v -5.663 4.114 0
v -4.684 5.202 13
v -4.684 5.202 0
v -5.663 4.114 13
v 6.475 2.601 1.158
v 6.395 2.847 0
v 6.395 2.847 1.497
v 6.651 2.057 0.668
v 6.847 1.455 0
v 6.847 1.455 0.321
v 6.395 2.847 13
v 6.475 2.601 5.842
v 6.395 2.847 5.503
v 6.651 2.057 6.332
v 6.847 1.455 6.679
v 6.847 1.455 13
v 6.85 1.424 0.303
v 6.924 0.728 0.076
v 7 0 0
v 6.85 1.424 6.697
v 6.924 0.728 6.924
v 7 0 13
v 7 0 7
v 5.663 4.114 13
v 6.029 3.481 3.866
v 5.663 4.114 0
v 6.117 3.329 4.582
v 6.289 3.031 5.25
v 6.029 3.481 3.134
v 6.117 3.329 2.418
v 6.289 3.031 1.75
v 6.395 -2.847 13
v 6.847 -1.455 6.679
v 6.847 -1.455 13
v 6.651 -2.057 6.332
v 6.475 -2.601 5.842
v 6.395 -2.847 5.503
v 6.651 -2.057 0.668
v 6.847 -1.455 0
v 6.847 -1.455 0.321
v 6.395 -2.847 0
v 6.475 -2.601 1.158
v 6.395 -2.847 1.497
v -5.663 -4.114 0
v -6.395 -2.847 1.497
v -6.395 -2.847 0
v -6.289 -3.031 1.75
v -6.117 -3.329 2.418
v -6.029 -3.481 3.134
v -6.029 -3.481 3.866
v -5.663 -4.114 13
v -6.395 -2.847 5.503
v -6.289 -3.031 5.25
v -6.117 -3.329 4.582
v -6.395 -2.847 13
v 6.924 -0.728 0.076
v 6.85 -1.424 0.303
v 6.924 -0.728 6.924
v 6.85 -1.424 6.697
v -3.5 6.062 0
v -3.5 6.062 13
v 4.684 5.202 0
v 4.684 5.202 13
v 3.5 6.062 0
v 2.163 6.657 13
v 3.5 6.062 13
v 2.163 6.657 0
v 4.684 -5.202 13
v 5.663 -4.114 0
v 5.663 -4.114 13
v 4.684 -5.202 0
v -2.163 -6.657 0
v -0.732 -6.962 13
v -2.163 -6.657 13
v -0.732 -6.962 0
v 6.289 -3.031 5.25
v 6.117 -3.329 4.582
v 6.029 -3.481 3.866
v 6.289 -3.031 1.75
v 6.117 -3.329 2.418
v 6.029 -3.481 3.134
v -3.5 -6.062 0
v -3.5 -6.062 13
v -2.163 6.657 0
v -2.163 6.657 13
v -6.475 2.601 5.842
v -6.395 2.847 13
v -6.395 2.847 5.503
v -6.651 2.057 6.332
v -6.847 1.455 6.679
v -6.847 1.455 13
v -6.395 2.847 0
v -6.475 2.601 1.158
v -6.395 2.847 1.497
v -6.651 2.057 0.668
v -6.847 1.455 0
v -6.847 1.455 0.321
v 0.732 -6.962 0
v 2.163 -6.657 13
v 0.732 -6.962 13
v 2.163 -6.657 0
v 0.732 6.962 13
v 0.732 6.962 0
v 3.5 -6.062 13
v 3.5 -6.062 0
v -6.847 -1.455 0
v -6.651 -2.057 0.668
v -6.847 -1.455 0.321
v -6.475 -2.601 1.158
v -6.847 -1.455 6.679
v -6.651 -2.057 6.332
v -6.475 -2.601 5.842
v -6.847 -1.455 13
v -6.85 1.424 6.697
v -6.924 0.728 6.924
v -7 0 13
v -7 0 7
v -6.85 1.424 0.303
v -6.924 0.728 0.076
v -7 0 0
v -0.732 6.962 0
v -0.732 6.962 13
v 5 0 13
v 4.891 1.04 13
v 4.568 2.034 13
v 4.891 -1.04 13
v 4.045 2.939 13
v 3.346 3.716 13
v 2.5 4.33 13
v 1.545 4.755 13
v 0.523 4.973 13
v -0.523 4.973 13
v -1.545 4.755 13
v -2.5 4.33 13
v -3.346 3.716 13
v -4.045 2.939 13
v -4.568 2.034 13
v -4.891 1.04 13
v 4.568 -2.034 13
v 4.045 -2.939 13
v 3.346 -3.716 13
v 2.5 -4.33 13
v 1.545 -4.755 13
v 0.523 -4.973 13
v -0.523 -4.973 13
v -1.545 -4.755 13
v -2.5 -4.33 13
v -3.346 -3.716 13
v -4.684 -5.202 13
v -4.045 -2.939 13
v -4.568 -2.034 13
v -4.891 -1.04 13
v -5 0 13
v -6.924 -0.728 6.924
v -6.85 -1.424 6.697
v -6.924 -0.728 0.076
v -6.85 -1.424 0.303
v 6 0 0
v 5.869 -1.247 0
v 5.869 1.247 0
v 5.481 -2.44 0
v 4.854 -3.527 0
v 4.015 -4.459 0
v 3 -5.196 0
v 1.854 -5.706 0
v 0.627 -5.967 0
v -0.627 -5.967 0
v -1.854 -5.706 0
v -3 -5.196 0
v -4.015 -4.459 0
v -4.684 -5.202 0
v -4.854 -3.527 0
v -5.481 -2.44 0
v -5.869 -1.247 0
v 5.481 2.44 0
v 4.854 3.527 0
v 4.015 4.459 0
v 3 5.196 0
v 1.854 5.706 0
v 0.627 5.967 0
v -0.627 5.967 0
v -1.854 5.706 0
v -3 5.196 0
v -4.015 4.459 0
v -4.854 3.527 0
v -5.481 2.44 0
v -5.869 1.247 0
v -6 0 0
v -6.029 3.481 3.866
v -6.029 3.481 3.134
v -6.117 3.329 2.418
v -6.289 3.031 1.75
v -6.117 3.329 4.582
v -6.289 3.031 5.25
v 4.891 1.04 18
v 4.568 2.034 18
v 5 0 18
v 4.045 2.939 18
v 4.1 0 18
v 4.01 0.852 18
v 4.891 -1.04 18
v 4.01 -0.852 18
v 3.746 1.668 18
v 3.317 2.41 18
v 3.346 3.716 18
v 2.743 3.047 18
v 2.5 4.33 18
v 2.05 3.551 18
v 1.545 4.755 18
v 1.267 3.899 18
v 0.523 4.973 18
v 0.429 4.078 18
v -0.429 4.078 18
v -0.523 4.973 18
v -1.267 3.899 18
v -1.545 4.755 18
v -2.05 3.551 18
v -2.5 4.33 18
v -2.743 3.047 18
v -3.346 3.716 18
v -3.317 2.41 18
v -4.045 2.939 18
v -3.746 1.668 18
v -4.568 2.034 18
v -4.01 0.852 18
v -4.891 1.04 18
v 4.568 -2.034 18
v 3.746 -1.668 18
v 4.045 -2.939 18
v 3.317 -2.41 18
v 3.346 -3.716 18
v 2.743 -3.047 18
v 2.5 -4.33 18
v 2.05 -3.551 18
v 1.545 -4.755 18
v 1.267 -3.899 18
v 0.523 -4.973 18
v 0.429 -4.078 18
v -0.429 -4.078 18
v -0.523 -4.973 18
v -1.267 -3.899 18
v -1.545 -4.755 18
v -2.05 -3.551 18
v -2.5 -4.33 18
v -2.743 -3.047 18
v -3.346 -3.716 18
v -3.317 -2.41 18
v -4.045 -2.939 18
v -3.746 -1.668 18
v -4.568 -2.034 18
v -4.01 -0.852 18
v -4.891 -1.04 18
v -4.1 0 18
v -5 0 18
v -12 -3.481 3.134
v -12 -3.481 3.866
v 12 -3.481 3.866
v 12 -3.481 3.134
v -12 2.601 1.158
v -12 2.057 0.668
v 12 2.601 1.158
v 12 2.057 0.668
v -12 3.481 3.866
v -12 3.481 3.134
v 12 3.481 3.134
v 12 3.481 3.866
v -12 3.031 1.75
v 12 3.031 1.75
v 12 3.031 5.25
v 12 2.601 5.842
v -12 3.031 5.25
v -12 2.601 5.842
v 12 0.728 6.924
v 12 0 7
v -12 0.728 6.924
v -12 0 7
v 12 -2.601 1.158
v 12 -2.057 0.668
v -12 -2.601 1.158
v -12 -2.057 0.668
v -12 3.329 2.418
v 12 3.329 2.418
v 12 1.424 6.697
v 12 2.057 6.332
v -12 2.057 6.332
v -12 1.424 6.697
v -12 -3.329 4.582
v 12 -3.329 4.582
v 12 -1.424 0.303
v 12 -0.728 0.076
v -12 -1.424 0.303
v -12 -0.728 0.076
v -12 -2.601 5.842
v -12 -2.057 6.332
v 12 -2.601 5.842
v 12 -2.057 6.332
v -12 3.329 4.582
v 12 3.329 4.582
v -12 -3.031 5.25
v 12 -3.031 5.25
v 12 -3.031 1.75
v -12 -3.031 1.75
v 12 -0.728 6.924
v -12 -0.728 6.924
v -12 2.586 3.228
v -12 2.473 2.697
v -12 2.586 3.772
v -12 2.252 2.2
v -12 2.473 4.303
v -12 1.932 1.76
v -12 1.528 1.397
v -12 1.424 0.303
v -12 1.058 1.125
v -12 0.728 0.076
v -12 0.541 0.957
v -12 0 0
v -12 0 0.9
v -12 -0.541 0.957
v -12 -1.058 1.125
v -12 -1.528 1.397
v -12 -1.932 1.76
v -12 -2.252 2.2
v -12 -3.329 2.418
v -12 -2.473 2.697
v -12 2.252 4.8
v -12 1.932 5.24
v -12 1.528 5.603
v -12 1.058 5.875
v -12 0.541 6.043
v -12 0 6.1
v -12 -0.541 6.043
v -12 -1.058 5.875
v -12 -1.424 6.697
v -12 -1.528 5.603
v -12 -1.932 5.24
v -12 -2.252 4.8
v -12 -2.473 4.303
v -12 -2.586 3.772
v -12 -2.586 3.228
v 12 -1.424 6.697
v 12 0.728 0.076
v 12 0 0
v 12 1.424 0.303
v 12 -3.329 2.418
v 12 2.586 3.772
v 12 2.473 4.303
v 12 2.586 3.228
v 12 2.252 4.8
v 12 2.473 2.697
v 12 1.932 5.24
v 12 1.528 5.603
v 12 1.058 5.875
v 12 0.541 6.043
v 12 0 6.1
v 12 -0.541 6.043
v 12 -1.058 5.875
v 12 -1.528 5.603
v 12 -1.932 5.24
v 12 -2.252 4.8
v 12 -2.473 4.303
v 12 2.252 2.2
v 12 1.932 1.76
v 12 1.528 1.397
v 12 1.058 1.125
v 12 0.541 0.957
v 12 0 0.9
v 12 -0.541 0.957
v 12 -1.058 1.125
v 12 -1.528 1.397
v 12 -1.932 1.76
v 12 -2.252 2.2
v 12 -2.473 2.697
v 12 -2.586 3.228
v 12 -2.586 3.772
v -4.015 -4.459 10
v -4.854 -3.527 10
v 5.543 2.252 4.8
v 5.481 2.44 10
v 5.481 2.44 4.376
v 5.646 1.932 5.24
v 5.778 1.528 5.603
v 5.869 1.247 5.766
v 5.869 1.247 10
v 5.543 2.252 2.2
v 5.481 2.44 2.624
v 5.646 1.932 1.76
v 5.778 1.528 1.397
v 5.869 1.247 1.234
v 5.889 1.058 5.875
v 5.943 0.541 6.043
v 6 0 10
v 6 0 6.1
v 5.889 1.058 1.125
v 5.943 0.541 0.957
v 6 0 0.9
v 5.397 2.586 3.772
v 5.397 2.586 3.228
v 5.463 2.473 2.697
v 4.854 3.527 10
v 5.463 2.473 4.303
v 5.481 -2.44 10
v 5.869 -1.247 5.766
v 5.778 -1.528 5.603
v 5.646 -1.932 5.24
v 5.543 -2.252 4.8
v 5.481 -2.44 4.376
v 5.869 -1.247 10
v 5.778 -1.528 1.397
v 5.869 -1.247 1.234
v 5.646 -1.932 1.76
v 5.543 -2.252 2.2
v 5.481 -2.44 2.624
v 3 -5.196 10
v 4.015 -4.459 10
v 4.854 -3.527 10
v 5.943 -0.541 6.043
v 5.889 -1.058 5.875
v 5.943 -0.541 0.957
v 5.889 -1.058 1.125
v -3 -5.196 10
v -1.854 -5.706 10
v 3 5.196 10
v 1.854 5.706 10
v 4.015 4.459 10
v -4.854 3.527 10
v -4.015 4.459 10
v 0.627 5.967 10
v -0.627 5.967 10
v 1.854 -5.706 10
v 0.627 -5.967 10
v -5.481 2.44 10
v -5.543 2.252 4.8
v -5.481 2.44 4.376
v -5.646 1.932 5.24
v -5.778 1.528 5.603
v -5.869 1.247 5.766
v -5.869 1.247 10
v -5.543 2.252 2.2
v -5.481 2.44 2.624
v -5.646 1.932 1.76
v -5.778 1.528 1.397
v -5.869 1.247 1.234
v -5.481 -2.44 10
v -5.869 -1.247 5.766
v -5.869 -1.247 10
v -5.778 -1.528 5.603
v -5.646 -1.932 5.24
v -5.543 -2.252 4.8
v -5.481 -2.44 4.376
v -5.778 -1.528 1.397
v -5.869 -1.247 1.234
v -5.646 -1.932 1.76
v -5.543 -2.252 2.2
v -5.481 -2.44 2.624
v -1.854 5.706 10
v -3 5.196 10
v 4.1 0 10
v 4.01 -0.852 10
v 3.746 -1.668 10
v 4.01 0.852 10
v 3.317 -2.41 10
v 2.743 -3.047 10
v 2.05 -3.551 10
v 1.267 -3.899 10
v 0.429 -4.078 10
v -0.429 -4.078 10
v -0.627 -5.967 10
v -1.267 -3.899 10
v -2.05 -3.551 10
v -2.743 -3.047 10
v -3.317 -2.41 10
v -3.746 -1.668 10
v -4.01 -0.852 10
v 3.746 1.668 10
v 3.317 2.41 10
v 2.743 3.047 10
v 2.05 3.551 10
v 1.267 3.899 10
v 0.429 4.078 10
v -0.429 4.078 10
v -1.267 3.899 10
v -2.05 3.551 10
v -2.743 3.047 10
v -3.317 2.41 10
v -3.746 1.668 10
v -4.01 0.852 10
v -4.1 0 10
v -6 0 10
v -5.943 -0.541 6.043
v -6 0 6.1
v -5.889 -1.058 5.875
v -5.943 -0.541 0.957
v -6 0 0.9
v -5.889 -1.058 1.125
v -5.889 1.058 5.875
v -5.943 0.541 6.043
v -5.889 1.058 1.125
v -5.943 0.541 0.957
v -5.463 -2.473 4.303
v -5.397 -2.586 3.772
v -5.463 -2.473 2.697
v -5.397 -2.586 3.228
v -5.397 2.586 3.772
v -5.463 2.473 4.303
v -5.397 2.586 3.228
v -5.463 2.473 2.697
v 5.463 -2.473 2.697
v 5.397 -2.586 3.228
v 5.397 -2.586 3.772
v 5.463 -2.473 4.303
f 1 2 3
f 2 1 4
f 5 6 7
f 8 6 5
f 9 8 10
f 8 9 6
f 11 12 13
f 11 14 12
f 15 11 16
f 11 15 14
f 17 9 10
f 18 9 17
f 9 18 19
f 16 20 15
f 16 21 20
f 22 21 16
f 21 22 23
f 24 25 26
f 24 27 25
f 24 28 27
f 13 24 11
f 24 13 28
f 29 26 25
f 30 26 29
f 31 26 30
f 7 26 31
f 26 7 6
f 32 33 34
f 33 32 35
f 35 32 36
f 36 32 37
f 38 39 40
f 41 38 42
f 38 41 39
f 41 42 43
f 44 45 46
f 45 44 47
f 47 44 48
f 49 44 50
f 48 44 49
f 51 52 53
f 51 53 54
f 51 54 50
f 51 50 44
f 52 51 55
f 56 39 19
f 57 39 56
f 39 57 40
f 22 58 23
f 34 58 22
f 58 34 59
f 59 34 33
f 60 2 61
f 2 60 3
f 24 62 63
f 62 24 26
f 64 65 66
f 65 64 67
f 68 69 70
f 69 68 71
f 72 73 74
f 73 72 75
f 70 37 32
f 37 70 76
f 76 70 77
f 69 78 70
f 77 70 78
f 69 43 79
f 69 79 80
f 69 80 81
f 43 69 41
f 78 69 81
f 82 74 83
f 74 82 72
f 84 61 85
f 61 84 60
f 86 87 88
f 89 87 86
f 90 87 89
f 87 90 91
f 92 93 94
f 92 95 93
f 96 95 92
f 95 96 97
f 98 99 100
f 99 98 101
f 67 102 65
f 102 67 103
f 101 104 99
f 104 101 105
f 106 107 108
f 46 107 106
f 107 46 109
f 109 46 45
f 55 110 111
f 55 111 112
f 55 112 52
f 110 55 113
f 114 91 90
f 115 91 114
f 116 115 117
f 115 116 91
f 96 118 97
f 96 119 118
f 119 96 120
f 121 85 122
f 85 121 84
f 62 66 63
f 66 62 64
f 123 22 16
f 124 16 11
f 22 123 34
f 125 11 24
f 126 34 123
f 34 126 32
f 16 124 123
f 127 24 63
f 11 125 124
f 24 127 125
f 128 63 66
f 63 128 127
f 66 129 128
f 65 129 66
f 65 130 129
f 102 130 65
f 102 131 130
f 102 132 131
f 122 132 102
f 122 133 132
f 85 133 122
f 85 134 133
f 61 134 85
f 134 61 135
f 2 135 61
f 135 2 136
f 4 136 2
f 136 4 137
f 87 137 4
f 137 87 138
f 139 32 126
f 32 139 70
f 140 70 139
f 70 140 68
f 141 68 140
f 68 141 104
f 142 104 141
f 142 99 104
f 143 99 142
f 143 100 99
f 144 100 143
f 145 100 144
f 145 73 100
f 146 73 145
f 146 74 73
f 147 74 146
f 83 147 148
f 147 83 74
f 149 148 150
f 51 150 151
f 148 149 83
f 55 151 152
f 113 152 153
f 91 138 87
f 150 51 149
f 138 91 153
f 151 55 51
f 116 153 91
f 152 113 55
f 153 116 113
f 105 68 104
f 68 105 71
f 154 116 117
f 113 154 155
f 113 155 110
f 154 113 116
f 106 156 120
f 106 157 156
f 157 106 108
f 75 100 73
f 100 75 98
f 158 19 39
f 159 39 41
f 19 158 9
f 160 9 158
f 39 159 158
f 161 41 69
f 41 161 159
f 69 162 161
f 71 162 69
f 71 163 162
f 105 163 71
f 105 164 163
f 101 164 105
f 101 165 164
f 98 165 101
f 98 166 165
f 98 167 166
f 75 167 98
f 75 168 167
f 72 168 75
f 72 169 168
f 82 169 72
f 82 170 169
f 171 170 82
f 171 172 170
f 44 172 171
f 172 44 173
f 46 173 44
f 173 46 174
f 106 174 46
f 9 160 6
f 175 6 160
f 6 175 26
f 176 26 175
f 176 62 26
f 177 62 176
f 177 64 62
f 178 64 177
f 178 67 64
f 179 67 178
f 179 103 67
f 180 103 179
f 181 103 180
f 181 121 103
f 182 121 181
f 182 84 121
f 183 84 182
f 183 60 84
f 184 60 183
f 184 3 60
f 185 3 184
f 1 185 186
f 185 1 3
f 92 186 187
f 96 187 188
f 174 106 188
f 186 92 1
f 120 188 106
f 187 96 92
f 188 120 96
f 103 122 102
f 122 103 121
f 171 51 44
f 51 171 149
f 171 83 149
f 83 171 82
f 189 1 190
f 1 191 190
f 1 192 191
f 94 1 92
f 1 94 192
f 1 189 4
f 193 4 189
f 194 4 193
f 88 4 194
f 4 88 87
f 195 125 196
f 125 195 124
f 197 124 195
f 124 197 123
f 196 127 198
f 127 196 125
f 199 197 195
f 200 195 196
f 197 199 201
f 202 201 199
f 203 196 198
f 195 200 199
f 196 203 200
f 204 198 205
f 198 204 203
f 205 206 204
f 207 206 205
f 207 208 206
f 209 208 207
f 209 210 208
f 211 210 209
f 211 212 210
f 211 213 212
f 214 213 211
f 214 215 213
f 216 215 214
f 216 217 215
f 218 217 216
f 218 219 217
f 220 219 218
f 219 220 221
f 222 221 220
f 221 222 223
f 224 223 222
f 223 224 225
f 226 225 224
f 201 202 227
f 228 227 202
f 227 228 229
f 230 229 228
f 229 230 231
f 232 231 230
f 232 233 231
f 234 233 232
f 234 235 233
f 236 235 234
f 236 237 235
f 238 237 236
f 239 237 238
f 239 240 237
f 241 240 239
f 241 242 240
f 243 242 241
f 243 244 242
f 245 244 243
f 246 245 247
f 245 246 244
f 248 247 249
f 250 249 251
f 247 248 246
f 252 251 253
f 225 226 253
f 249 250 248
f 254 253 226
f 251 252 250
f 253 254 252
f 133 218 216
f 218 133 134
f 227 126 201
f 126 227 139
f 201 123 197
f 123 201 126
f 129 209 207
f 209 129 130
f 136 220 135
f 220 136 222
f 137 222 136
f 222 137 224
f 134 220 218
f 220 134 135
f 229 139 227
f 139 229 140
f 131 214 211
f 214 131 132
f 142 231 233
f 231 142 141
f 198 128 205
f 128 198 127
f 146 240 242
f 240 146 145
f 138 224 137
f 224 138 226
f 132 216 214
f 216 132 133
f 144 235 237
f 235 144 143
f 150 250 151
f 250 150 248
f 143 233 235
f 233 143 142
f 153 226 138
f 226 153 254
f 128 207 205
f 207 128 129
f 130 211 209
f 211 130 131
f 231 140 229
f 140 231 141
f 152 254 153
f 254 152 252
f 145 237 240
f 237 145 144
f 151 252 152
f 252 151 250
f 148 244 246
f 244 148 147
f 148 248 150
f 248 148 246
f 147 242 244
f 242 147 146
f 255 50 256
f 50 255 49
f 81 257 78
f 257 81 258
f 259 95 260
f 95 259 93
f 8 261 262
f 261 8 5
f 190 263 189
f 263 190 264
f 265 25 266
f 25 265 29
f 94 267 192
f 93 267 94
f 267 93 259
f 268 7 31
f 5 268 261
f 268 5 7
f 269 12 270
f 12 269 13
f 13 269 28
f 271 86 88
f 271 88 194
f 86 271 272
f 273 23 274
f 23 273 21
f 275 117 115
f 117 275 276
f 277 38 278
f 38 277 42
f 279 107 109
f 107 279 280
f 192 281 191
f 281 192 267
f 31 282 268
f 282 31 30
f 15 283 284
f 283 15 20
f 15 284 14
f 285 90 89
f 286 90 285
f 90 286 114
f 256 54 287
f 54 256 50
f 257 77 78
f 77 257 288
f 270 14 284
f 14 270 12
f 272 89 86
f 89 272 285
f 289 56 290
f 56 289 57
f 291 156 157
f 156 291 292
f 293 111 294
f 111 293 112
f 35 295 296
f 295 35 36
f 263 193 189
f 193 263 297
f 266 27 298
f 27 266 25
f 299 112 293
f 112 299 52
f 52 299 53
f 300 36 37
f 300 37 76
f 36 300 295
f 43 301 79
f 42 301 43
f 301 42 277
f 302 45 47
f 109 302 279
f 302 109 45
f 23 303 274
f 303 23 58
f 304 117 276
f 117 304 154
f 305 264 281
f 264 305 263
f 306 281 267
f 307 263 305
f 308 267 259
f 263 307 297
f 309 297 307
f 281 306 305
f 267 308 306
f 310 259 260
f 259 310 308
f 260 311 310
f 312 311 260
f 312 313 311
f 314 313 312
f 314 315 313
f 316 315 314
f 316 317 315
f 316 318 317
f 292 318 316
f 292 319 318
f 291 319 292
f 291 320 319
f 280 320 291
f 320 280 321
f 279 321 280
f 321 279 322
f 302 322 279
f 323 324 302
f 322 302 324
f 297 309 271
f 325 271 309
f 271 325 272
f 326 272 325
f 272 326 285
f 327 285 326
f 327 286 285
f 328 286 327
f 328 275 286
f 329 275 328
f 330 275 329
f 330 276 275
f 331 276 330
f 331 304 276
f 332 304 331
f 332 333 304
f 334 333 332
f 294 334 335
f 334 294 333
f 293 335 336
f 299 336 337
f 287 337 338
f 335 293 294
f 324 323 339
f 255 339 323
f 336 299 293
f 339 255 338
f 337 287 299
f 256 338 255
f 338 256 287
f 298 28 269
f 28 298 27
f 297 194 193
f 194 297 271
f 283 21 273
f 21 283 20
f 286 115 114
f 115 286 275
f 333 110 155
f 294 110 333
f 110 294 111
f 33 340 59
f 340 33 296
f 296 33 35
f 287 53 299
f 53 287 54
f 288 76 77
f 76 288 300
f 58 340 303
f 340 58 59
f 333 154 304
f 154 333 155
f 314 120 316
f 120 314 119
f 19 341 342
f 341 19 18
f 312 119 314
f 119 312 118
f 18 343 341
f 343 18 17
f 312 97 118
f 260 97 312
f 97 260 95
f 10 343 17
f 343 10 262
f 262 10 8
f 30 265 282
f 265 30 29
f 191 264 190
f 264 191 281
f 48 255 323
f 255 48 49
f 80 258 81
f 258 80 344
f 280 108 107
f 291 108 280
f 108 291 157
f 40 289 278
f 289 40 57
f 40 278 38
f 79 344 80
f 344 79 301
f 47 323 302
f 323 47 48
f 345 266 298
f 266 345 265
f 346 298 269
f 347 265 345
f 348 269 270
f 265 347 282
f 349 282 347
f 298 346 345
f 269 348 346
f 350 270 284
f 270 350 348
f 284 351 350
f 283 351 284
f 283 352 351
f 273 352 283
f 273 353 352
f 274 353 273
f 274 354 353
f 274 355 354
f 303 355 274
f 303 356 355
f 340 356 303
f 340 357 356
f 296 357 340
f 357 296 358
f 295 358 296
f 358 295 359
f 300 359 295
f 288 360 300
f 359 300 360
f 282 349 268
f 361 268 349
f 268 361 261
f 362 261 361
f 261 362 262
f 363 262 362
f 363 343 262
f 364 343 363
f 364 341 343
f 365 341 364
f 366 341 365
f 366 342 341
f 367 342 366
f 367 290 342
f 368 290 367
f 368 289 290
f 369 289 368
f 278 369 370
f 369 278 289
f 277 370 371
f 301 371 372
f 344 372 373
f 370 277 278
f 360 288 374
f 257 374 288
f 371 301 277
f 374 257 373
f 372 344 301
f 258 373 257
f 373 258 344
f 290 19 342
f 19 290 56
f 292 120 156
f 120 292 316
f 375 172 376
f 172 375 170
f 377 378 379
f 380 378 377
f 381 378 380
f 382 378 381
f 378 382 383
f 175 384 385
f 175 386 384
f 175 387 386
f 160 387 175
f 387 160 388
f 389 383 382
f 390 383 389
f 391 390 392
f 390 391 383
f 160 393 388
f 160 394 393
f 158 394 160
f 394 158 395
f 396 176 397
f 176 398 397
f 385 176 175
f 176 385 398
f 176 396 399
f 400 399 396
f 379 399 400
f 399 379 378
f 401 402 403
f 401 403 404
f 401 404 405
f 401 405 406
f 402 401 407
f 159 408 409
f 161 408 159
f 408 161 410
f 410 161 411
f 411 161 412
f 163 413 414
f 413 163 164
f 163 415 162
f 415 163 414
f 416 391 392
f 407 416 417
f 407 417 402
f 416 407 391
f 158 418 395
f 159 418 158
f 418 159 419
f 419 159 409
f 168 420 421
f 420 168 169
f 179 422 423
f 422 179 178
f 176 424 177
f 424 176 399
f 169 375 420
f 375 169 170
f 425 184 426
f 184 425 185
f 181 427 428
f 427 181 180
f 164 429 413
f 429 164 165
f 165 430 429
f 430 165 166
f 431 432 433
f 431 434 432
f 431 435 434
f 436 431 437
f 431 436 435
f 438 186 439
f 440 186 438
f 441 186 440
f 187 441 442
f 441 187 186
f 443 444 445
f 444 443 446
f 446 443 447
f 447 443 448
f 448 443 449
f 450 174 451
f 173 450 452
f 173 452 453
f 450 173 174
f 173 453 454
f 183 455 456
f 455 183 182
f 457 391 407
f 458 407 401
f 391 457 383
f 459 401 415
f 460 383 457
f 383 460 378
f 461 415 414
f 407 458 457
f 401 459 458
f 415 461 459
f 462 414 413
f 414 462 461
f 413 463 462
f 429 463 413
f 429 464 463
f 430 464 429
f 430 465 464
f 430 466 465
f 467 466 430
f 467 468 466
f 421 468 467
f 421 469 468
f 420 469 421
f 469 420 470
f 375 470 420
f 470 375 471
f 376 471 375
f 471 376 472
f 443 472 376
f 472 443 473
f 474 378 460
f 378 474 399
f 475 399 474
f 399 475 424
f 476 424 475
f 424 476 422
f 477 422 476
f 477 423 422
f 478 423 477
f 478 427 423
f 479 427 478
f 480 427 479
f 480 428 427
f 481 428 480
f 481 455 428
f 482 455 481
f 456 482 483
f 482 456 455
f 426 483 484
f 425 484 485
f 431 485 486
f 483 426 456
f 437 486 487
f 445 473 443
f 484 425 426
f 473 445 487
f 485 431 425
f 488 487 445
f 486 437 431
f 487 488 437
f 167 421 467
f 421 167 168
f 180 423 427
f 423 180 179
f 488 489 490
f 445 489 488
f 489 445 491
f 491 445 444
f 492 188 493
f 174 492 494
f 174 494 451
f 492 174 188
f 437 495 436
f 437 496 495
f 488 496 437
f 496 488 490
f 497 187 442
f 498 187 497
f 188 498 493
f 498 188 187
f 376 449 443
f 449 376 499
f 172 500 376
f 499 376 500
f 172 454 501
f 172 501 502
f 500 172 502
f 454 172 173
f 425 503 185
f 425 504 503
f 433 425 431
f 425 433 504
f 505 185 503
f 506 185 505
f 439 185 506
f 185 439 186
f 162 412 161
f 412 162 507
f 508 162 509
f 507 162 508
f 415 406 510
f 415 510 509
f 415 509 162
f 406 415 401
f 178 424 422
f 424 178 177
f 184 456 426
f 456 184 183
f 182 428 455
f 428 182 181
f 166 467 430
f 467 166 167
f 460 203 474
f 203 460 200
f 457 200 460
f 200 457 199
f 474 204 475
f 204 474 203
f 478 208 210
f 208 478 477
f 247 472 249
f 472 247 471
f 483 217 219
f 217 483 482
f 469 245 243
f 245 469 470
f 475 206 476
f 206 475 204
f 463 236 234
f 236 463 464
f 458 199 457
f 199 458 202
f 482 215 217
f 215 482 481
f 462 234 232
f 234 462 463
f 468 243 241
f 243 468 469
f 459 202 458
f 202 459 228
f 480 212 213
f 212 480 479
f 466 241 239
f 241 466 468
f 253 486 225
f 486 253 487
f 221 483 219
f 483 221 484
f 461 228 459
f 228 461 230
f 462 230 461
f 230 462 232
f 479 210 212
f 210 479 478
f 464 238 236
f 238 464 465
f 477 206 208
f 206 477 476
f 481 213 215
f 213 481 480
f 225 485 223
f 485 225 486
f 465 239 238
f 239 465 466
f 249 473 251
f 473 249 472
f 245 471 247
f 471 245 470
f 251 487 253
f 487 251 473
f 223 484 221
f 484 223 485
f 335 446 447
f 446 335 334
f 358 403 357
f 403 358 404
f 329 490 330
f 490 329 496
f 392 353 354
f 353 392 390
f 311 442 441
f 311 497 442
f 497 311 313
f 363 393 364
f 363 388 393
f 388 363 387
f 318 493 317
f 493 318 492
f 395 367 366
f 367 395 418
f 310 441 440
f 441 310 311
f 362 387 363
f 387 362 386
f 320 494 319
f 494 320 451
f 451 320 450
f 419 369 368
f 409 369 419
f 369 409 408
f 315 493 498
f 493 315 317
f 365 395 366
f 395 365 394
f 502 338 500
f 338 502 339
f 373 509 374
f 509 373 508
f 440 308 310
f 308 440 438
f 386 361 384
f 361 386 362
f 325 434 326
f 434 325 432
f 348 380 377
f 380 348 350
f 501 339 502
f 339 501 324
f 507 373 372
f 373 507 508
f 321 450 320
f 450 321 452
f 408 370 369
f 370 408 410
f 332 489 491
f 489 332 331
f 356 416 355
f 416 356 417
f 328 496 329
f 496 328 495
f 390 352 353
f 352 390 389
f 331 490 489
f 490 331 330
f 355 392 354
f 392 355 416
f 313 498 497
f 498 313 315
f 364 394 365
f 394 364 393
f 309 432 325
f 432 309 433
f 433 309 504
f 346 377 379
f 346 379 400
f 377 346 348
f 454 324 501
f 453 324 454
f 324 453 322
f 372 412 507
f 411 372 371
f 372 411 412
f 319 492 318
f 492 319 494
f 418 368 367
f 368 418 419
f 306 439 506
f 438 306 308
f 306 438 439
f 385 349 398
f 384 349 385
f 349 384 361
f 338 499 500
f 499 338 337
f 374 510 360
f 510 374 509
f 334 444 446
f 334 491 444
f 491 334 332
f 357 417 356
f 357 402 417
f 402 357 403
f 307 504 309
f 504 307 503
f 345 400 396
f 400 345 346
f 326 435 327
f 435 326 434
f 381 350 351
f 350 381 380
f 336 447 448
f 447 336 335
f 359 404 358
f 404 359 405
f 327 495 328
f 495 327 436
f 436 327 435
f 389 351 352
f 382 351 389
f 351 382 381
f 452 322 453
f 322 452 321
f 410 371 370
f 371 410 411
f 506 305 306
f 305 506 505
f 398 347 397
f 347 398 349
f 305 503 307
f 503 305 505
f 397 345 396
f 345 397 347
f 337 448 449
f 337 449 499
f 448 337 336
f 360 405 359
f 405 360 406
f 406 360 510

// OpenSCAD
screwD = 4;

noseHoleD = 12;
noseHoleH = 11;
tolerance = 0.1;

ledDx = 8; // main LED
ledD = 5;
ledH = 6;
wallT = 2;

module nosePokeAttachment(){
    $fn=30;
difference(){
union(){
cylinder(d=noseHoleD+wallT,h=noseHoleH+wallT);
cylinder(d=noseHoleD+2*screwD+7,h=wallT);
translate([0,0,noseHoleH+wallT]){
cylinder(d=ledDx+2,h=ledH-1);
}//end translate

translate([(noseHoleD+1)/2,0,ledD]){
rotate([0,90,0]){
    cylinder(d=ledD+wallT,h=ledH);
}//end rotate
}//end translate

translate([-(noseHoleD+1)/2,0,ledD]){
rotate([0,-90,0]){
    cylinder(d=ledD+wallT,h=ledH);
}//end rotate
}//end translate
}//end union


translate([0,0,-1]){
cylinder(d=noseHoleD,h=noseHoleH);
cylinder(d=ledDx+2*tolerance,h=ledH+noseHoleH+wallT+5);
}//end translate

translate([(noseHoleD+1)/2-wallT,0,ledD]){
rotate([0,90,0]){
    cylinder(d=ledD+2*tolerance,h=ledH+3);
}//end rotate
}//end translate

translate([-(noseHoleD+1)/2+wallT,0,ledD]){
rotate([0,-90,0]){
    cylinder(d=ledD+2*tolerance,h=ledH+3);
}//end rotate
}//end translate

translate([0,(noseHoleD)/2+screwD,-1]){
cylinder(d=screwD+2*tolerance,h=10);
}//end translate

translate([0,-(noseHoleD)/2-screwD,-1]){
cylinder(d=screwD+2*tolerance,h=10);
}//end translate
}//end difference
}//end module

module nosePoke(){
    $fn=30;
difference(){
union(){
cylinder(d=noseHoleD+wallT,h=noseHoleH+wallT);

translate([0,0,noseHoleH+wallT]){
cylinder(d=ledDx+2,h=ledH-1);
}//end translate


translate([noseHoleD/2+ledH,0,3.5]){
rotate([0,-90,0]){
    cylinder(d=ledD+wallT,h=2*ledH+noseHoleD);
}//end rotate
}//end translate
}//end union


translate([0,0,-1]){
    cylinder(d=noseHoleD,h=noseHoleH);
    cylinder(d=ledDx+2*tolerance,h=ledH+noseHoleH+wallT+5);
}//end translate

translate([-25,0,3.5]){
    rotate([0,90,0]){
        cylinder(d=ledD+2*tolerance,h=50);
}//end rotate
}//end translate


}//end difference
}//end module

  
nosePoke();
 
